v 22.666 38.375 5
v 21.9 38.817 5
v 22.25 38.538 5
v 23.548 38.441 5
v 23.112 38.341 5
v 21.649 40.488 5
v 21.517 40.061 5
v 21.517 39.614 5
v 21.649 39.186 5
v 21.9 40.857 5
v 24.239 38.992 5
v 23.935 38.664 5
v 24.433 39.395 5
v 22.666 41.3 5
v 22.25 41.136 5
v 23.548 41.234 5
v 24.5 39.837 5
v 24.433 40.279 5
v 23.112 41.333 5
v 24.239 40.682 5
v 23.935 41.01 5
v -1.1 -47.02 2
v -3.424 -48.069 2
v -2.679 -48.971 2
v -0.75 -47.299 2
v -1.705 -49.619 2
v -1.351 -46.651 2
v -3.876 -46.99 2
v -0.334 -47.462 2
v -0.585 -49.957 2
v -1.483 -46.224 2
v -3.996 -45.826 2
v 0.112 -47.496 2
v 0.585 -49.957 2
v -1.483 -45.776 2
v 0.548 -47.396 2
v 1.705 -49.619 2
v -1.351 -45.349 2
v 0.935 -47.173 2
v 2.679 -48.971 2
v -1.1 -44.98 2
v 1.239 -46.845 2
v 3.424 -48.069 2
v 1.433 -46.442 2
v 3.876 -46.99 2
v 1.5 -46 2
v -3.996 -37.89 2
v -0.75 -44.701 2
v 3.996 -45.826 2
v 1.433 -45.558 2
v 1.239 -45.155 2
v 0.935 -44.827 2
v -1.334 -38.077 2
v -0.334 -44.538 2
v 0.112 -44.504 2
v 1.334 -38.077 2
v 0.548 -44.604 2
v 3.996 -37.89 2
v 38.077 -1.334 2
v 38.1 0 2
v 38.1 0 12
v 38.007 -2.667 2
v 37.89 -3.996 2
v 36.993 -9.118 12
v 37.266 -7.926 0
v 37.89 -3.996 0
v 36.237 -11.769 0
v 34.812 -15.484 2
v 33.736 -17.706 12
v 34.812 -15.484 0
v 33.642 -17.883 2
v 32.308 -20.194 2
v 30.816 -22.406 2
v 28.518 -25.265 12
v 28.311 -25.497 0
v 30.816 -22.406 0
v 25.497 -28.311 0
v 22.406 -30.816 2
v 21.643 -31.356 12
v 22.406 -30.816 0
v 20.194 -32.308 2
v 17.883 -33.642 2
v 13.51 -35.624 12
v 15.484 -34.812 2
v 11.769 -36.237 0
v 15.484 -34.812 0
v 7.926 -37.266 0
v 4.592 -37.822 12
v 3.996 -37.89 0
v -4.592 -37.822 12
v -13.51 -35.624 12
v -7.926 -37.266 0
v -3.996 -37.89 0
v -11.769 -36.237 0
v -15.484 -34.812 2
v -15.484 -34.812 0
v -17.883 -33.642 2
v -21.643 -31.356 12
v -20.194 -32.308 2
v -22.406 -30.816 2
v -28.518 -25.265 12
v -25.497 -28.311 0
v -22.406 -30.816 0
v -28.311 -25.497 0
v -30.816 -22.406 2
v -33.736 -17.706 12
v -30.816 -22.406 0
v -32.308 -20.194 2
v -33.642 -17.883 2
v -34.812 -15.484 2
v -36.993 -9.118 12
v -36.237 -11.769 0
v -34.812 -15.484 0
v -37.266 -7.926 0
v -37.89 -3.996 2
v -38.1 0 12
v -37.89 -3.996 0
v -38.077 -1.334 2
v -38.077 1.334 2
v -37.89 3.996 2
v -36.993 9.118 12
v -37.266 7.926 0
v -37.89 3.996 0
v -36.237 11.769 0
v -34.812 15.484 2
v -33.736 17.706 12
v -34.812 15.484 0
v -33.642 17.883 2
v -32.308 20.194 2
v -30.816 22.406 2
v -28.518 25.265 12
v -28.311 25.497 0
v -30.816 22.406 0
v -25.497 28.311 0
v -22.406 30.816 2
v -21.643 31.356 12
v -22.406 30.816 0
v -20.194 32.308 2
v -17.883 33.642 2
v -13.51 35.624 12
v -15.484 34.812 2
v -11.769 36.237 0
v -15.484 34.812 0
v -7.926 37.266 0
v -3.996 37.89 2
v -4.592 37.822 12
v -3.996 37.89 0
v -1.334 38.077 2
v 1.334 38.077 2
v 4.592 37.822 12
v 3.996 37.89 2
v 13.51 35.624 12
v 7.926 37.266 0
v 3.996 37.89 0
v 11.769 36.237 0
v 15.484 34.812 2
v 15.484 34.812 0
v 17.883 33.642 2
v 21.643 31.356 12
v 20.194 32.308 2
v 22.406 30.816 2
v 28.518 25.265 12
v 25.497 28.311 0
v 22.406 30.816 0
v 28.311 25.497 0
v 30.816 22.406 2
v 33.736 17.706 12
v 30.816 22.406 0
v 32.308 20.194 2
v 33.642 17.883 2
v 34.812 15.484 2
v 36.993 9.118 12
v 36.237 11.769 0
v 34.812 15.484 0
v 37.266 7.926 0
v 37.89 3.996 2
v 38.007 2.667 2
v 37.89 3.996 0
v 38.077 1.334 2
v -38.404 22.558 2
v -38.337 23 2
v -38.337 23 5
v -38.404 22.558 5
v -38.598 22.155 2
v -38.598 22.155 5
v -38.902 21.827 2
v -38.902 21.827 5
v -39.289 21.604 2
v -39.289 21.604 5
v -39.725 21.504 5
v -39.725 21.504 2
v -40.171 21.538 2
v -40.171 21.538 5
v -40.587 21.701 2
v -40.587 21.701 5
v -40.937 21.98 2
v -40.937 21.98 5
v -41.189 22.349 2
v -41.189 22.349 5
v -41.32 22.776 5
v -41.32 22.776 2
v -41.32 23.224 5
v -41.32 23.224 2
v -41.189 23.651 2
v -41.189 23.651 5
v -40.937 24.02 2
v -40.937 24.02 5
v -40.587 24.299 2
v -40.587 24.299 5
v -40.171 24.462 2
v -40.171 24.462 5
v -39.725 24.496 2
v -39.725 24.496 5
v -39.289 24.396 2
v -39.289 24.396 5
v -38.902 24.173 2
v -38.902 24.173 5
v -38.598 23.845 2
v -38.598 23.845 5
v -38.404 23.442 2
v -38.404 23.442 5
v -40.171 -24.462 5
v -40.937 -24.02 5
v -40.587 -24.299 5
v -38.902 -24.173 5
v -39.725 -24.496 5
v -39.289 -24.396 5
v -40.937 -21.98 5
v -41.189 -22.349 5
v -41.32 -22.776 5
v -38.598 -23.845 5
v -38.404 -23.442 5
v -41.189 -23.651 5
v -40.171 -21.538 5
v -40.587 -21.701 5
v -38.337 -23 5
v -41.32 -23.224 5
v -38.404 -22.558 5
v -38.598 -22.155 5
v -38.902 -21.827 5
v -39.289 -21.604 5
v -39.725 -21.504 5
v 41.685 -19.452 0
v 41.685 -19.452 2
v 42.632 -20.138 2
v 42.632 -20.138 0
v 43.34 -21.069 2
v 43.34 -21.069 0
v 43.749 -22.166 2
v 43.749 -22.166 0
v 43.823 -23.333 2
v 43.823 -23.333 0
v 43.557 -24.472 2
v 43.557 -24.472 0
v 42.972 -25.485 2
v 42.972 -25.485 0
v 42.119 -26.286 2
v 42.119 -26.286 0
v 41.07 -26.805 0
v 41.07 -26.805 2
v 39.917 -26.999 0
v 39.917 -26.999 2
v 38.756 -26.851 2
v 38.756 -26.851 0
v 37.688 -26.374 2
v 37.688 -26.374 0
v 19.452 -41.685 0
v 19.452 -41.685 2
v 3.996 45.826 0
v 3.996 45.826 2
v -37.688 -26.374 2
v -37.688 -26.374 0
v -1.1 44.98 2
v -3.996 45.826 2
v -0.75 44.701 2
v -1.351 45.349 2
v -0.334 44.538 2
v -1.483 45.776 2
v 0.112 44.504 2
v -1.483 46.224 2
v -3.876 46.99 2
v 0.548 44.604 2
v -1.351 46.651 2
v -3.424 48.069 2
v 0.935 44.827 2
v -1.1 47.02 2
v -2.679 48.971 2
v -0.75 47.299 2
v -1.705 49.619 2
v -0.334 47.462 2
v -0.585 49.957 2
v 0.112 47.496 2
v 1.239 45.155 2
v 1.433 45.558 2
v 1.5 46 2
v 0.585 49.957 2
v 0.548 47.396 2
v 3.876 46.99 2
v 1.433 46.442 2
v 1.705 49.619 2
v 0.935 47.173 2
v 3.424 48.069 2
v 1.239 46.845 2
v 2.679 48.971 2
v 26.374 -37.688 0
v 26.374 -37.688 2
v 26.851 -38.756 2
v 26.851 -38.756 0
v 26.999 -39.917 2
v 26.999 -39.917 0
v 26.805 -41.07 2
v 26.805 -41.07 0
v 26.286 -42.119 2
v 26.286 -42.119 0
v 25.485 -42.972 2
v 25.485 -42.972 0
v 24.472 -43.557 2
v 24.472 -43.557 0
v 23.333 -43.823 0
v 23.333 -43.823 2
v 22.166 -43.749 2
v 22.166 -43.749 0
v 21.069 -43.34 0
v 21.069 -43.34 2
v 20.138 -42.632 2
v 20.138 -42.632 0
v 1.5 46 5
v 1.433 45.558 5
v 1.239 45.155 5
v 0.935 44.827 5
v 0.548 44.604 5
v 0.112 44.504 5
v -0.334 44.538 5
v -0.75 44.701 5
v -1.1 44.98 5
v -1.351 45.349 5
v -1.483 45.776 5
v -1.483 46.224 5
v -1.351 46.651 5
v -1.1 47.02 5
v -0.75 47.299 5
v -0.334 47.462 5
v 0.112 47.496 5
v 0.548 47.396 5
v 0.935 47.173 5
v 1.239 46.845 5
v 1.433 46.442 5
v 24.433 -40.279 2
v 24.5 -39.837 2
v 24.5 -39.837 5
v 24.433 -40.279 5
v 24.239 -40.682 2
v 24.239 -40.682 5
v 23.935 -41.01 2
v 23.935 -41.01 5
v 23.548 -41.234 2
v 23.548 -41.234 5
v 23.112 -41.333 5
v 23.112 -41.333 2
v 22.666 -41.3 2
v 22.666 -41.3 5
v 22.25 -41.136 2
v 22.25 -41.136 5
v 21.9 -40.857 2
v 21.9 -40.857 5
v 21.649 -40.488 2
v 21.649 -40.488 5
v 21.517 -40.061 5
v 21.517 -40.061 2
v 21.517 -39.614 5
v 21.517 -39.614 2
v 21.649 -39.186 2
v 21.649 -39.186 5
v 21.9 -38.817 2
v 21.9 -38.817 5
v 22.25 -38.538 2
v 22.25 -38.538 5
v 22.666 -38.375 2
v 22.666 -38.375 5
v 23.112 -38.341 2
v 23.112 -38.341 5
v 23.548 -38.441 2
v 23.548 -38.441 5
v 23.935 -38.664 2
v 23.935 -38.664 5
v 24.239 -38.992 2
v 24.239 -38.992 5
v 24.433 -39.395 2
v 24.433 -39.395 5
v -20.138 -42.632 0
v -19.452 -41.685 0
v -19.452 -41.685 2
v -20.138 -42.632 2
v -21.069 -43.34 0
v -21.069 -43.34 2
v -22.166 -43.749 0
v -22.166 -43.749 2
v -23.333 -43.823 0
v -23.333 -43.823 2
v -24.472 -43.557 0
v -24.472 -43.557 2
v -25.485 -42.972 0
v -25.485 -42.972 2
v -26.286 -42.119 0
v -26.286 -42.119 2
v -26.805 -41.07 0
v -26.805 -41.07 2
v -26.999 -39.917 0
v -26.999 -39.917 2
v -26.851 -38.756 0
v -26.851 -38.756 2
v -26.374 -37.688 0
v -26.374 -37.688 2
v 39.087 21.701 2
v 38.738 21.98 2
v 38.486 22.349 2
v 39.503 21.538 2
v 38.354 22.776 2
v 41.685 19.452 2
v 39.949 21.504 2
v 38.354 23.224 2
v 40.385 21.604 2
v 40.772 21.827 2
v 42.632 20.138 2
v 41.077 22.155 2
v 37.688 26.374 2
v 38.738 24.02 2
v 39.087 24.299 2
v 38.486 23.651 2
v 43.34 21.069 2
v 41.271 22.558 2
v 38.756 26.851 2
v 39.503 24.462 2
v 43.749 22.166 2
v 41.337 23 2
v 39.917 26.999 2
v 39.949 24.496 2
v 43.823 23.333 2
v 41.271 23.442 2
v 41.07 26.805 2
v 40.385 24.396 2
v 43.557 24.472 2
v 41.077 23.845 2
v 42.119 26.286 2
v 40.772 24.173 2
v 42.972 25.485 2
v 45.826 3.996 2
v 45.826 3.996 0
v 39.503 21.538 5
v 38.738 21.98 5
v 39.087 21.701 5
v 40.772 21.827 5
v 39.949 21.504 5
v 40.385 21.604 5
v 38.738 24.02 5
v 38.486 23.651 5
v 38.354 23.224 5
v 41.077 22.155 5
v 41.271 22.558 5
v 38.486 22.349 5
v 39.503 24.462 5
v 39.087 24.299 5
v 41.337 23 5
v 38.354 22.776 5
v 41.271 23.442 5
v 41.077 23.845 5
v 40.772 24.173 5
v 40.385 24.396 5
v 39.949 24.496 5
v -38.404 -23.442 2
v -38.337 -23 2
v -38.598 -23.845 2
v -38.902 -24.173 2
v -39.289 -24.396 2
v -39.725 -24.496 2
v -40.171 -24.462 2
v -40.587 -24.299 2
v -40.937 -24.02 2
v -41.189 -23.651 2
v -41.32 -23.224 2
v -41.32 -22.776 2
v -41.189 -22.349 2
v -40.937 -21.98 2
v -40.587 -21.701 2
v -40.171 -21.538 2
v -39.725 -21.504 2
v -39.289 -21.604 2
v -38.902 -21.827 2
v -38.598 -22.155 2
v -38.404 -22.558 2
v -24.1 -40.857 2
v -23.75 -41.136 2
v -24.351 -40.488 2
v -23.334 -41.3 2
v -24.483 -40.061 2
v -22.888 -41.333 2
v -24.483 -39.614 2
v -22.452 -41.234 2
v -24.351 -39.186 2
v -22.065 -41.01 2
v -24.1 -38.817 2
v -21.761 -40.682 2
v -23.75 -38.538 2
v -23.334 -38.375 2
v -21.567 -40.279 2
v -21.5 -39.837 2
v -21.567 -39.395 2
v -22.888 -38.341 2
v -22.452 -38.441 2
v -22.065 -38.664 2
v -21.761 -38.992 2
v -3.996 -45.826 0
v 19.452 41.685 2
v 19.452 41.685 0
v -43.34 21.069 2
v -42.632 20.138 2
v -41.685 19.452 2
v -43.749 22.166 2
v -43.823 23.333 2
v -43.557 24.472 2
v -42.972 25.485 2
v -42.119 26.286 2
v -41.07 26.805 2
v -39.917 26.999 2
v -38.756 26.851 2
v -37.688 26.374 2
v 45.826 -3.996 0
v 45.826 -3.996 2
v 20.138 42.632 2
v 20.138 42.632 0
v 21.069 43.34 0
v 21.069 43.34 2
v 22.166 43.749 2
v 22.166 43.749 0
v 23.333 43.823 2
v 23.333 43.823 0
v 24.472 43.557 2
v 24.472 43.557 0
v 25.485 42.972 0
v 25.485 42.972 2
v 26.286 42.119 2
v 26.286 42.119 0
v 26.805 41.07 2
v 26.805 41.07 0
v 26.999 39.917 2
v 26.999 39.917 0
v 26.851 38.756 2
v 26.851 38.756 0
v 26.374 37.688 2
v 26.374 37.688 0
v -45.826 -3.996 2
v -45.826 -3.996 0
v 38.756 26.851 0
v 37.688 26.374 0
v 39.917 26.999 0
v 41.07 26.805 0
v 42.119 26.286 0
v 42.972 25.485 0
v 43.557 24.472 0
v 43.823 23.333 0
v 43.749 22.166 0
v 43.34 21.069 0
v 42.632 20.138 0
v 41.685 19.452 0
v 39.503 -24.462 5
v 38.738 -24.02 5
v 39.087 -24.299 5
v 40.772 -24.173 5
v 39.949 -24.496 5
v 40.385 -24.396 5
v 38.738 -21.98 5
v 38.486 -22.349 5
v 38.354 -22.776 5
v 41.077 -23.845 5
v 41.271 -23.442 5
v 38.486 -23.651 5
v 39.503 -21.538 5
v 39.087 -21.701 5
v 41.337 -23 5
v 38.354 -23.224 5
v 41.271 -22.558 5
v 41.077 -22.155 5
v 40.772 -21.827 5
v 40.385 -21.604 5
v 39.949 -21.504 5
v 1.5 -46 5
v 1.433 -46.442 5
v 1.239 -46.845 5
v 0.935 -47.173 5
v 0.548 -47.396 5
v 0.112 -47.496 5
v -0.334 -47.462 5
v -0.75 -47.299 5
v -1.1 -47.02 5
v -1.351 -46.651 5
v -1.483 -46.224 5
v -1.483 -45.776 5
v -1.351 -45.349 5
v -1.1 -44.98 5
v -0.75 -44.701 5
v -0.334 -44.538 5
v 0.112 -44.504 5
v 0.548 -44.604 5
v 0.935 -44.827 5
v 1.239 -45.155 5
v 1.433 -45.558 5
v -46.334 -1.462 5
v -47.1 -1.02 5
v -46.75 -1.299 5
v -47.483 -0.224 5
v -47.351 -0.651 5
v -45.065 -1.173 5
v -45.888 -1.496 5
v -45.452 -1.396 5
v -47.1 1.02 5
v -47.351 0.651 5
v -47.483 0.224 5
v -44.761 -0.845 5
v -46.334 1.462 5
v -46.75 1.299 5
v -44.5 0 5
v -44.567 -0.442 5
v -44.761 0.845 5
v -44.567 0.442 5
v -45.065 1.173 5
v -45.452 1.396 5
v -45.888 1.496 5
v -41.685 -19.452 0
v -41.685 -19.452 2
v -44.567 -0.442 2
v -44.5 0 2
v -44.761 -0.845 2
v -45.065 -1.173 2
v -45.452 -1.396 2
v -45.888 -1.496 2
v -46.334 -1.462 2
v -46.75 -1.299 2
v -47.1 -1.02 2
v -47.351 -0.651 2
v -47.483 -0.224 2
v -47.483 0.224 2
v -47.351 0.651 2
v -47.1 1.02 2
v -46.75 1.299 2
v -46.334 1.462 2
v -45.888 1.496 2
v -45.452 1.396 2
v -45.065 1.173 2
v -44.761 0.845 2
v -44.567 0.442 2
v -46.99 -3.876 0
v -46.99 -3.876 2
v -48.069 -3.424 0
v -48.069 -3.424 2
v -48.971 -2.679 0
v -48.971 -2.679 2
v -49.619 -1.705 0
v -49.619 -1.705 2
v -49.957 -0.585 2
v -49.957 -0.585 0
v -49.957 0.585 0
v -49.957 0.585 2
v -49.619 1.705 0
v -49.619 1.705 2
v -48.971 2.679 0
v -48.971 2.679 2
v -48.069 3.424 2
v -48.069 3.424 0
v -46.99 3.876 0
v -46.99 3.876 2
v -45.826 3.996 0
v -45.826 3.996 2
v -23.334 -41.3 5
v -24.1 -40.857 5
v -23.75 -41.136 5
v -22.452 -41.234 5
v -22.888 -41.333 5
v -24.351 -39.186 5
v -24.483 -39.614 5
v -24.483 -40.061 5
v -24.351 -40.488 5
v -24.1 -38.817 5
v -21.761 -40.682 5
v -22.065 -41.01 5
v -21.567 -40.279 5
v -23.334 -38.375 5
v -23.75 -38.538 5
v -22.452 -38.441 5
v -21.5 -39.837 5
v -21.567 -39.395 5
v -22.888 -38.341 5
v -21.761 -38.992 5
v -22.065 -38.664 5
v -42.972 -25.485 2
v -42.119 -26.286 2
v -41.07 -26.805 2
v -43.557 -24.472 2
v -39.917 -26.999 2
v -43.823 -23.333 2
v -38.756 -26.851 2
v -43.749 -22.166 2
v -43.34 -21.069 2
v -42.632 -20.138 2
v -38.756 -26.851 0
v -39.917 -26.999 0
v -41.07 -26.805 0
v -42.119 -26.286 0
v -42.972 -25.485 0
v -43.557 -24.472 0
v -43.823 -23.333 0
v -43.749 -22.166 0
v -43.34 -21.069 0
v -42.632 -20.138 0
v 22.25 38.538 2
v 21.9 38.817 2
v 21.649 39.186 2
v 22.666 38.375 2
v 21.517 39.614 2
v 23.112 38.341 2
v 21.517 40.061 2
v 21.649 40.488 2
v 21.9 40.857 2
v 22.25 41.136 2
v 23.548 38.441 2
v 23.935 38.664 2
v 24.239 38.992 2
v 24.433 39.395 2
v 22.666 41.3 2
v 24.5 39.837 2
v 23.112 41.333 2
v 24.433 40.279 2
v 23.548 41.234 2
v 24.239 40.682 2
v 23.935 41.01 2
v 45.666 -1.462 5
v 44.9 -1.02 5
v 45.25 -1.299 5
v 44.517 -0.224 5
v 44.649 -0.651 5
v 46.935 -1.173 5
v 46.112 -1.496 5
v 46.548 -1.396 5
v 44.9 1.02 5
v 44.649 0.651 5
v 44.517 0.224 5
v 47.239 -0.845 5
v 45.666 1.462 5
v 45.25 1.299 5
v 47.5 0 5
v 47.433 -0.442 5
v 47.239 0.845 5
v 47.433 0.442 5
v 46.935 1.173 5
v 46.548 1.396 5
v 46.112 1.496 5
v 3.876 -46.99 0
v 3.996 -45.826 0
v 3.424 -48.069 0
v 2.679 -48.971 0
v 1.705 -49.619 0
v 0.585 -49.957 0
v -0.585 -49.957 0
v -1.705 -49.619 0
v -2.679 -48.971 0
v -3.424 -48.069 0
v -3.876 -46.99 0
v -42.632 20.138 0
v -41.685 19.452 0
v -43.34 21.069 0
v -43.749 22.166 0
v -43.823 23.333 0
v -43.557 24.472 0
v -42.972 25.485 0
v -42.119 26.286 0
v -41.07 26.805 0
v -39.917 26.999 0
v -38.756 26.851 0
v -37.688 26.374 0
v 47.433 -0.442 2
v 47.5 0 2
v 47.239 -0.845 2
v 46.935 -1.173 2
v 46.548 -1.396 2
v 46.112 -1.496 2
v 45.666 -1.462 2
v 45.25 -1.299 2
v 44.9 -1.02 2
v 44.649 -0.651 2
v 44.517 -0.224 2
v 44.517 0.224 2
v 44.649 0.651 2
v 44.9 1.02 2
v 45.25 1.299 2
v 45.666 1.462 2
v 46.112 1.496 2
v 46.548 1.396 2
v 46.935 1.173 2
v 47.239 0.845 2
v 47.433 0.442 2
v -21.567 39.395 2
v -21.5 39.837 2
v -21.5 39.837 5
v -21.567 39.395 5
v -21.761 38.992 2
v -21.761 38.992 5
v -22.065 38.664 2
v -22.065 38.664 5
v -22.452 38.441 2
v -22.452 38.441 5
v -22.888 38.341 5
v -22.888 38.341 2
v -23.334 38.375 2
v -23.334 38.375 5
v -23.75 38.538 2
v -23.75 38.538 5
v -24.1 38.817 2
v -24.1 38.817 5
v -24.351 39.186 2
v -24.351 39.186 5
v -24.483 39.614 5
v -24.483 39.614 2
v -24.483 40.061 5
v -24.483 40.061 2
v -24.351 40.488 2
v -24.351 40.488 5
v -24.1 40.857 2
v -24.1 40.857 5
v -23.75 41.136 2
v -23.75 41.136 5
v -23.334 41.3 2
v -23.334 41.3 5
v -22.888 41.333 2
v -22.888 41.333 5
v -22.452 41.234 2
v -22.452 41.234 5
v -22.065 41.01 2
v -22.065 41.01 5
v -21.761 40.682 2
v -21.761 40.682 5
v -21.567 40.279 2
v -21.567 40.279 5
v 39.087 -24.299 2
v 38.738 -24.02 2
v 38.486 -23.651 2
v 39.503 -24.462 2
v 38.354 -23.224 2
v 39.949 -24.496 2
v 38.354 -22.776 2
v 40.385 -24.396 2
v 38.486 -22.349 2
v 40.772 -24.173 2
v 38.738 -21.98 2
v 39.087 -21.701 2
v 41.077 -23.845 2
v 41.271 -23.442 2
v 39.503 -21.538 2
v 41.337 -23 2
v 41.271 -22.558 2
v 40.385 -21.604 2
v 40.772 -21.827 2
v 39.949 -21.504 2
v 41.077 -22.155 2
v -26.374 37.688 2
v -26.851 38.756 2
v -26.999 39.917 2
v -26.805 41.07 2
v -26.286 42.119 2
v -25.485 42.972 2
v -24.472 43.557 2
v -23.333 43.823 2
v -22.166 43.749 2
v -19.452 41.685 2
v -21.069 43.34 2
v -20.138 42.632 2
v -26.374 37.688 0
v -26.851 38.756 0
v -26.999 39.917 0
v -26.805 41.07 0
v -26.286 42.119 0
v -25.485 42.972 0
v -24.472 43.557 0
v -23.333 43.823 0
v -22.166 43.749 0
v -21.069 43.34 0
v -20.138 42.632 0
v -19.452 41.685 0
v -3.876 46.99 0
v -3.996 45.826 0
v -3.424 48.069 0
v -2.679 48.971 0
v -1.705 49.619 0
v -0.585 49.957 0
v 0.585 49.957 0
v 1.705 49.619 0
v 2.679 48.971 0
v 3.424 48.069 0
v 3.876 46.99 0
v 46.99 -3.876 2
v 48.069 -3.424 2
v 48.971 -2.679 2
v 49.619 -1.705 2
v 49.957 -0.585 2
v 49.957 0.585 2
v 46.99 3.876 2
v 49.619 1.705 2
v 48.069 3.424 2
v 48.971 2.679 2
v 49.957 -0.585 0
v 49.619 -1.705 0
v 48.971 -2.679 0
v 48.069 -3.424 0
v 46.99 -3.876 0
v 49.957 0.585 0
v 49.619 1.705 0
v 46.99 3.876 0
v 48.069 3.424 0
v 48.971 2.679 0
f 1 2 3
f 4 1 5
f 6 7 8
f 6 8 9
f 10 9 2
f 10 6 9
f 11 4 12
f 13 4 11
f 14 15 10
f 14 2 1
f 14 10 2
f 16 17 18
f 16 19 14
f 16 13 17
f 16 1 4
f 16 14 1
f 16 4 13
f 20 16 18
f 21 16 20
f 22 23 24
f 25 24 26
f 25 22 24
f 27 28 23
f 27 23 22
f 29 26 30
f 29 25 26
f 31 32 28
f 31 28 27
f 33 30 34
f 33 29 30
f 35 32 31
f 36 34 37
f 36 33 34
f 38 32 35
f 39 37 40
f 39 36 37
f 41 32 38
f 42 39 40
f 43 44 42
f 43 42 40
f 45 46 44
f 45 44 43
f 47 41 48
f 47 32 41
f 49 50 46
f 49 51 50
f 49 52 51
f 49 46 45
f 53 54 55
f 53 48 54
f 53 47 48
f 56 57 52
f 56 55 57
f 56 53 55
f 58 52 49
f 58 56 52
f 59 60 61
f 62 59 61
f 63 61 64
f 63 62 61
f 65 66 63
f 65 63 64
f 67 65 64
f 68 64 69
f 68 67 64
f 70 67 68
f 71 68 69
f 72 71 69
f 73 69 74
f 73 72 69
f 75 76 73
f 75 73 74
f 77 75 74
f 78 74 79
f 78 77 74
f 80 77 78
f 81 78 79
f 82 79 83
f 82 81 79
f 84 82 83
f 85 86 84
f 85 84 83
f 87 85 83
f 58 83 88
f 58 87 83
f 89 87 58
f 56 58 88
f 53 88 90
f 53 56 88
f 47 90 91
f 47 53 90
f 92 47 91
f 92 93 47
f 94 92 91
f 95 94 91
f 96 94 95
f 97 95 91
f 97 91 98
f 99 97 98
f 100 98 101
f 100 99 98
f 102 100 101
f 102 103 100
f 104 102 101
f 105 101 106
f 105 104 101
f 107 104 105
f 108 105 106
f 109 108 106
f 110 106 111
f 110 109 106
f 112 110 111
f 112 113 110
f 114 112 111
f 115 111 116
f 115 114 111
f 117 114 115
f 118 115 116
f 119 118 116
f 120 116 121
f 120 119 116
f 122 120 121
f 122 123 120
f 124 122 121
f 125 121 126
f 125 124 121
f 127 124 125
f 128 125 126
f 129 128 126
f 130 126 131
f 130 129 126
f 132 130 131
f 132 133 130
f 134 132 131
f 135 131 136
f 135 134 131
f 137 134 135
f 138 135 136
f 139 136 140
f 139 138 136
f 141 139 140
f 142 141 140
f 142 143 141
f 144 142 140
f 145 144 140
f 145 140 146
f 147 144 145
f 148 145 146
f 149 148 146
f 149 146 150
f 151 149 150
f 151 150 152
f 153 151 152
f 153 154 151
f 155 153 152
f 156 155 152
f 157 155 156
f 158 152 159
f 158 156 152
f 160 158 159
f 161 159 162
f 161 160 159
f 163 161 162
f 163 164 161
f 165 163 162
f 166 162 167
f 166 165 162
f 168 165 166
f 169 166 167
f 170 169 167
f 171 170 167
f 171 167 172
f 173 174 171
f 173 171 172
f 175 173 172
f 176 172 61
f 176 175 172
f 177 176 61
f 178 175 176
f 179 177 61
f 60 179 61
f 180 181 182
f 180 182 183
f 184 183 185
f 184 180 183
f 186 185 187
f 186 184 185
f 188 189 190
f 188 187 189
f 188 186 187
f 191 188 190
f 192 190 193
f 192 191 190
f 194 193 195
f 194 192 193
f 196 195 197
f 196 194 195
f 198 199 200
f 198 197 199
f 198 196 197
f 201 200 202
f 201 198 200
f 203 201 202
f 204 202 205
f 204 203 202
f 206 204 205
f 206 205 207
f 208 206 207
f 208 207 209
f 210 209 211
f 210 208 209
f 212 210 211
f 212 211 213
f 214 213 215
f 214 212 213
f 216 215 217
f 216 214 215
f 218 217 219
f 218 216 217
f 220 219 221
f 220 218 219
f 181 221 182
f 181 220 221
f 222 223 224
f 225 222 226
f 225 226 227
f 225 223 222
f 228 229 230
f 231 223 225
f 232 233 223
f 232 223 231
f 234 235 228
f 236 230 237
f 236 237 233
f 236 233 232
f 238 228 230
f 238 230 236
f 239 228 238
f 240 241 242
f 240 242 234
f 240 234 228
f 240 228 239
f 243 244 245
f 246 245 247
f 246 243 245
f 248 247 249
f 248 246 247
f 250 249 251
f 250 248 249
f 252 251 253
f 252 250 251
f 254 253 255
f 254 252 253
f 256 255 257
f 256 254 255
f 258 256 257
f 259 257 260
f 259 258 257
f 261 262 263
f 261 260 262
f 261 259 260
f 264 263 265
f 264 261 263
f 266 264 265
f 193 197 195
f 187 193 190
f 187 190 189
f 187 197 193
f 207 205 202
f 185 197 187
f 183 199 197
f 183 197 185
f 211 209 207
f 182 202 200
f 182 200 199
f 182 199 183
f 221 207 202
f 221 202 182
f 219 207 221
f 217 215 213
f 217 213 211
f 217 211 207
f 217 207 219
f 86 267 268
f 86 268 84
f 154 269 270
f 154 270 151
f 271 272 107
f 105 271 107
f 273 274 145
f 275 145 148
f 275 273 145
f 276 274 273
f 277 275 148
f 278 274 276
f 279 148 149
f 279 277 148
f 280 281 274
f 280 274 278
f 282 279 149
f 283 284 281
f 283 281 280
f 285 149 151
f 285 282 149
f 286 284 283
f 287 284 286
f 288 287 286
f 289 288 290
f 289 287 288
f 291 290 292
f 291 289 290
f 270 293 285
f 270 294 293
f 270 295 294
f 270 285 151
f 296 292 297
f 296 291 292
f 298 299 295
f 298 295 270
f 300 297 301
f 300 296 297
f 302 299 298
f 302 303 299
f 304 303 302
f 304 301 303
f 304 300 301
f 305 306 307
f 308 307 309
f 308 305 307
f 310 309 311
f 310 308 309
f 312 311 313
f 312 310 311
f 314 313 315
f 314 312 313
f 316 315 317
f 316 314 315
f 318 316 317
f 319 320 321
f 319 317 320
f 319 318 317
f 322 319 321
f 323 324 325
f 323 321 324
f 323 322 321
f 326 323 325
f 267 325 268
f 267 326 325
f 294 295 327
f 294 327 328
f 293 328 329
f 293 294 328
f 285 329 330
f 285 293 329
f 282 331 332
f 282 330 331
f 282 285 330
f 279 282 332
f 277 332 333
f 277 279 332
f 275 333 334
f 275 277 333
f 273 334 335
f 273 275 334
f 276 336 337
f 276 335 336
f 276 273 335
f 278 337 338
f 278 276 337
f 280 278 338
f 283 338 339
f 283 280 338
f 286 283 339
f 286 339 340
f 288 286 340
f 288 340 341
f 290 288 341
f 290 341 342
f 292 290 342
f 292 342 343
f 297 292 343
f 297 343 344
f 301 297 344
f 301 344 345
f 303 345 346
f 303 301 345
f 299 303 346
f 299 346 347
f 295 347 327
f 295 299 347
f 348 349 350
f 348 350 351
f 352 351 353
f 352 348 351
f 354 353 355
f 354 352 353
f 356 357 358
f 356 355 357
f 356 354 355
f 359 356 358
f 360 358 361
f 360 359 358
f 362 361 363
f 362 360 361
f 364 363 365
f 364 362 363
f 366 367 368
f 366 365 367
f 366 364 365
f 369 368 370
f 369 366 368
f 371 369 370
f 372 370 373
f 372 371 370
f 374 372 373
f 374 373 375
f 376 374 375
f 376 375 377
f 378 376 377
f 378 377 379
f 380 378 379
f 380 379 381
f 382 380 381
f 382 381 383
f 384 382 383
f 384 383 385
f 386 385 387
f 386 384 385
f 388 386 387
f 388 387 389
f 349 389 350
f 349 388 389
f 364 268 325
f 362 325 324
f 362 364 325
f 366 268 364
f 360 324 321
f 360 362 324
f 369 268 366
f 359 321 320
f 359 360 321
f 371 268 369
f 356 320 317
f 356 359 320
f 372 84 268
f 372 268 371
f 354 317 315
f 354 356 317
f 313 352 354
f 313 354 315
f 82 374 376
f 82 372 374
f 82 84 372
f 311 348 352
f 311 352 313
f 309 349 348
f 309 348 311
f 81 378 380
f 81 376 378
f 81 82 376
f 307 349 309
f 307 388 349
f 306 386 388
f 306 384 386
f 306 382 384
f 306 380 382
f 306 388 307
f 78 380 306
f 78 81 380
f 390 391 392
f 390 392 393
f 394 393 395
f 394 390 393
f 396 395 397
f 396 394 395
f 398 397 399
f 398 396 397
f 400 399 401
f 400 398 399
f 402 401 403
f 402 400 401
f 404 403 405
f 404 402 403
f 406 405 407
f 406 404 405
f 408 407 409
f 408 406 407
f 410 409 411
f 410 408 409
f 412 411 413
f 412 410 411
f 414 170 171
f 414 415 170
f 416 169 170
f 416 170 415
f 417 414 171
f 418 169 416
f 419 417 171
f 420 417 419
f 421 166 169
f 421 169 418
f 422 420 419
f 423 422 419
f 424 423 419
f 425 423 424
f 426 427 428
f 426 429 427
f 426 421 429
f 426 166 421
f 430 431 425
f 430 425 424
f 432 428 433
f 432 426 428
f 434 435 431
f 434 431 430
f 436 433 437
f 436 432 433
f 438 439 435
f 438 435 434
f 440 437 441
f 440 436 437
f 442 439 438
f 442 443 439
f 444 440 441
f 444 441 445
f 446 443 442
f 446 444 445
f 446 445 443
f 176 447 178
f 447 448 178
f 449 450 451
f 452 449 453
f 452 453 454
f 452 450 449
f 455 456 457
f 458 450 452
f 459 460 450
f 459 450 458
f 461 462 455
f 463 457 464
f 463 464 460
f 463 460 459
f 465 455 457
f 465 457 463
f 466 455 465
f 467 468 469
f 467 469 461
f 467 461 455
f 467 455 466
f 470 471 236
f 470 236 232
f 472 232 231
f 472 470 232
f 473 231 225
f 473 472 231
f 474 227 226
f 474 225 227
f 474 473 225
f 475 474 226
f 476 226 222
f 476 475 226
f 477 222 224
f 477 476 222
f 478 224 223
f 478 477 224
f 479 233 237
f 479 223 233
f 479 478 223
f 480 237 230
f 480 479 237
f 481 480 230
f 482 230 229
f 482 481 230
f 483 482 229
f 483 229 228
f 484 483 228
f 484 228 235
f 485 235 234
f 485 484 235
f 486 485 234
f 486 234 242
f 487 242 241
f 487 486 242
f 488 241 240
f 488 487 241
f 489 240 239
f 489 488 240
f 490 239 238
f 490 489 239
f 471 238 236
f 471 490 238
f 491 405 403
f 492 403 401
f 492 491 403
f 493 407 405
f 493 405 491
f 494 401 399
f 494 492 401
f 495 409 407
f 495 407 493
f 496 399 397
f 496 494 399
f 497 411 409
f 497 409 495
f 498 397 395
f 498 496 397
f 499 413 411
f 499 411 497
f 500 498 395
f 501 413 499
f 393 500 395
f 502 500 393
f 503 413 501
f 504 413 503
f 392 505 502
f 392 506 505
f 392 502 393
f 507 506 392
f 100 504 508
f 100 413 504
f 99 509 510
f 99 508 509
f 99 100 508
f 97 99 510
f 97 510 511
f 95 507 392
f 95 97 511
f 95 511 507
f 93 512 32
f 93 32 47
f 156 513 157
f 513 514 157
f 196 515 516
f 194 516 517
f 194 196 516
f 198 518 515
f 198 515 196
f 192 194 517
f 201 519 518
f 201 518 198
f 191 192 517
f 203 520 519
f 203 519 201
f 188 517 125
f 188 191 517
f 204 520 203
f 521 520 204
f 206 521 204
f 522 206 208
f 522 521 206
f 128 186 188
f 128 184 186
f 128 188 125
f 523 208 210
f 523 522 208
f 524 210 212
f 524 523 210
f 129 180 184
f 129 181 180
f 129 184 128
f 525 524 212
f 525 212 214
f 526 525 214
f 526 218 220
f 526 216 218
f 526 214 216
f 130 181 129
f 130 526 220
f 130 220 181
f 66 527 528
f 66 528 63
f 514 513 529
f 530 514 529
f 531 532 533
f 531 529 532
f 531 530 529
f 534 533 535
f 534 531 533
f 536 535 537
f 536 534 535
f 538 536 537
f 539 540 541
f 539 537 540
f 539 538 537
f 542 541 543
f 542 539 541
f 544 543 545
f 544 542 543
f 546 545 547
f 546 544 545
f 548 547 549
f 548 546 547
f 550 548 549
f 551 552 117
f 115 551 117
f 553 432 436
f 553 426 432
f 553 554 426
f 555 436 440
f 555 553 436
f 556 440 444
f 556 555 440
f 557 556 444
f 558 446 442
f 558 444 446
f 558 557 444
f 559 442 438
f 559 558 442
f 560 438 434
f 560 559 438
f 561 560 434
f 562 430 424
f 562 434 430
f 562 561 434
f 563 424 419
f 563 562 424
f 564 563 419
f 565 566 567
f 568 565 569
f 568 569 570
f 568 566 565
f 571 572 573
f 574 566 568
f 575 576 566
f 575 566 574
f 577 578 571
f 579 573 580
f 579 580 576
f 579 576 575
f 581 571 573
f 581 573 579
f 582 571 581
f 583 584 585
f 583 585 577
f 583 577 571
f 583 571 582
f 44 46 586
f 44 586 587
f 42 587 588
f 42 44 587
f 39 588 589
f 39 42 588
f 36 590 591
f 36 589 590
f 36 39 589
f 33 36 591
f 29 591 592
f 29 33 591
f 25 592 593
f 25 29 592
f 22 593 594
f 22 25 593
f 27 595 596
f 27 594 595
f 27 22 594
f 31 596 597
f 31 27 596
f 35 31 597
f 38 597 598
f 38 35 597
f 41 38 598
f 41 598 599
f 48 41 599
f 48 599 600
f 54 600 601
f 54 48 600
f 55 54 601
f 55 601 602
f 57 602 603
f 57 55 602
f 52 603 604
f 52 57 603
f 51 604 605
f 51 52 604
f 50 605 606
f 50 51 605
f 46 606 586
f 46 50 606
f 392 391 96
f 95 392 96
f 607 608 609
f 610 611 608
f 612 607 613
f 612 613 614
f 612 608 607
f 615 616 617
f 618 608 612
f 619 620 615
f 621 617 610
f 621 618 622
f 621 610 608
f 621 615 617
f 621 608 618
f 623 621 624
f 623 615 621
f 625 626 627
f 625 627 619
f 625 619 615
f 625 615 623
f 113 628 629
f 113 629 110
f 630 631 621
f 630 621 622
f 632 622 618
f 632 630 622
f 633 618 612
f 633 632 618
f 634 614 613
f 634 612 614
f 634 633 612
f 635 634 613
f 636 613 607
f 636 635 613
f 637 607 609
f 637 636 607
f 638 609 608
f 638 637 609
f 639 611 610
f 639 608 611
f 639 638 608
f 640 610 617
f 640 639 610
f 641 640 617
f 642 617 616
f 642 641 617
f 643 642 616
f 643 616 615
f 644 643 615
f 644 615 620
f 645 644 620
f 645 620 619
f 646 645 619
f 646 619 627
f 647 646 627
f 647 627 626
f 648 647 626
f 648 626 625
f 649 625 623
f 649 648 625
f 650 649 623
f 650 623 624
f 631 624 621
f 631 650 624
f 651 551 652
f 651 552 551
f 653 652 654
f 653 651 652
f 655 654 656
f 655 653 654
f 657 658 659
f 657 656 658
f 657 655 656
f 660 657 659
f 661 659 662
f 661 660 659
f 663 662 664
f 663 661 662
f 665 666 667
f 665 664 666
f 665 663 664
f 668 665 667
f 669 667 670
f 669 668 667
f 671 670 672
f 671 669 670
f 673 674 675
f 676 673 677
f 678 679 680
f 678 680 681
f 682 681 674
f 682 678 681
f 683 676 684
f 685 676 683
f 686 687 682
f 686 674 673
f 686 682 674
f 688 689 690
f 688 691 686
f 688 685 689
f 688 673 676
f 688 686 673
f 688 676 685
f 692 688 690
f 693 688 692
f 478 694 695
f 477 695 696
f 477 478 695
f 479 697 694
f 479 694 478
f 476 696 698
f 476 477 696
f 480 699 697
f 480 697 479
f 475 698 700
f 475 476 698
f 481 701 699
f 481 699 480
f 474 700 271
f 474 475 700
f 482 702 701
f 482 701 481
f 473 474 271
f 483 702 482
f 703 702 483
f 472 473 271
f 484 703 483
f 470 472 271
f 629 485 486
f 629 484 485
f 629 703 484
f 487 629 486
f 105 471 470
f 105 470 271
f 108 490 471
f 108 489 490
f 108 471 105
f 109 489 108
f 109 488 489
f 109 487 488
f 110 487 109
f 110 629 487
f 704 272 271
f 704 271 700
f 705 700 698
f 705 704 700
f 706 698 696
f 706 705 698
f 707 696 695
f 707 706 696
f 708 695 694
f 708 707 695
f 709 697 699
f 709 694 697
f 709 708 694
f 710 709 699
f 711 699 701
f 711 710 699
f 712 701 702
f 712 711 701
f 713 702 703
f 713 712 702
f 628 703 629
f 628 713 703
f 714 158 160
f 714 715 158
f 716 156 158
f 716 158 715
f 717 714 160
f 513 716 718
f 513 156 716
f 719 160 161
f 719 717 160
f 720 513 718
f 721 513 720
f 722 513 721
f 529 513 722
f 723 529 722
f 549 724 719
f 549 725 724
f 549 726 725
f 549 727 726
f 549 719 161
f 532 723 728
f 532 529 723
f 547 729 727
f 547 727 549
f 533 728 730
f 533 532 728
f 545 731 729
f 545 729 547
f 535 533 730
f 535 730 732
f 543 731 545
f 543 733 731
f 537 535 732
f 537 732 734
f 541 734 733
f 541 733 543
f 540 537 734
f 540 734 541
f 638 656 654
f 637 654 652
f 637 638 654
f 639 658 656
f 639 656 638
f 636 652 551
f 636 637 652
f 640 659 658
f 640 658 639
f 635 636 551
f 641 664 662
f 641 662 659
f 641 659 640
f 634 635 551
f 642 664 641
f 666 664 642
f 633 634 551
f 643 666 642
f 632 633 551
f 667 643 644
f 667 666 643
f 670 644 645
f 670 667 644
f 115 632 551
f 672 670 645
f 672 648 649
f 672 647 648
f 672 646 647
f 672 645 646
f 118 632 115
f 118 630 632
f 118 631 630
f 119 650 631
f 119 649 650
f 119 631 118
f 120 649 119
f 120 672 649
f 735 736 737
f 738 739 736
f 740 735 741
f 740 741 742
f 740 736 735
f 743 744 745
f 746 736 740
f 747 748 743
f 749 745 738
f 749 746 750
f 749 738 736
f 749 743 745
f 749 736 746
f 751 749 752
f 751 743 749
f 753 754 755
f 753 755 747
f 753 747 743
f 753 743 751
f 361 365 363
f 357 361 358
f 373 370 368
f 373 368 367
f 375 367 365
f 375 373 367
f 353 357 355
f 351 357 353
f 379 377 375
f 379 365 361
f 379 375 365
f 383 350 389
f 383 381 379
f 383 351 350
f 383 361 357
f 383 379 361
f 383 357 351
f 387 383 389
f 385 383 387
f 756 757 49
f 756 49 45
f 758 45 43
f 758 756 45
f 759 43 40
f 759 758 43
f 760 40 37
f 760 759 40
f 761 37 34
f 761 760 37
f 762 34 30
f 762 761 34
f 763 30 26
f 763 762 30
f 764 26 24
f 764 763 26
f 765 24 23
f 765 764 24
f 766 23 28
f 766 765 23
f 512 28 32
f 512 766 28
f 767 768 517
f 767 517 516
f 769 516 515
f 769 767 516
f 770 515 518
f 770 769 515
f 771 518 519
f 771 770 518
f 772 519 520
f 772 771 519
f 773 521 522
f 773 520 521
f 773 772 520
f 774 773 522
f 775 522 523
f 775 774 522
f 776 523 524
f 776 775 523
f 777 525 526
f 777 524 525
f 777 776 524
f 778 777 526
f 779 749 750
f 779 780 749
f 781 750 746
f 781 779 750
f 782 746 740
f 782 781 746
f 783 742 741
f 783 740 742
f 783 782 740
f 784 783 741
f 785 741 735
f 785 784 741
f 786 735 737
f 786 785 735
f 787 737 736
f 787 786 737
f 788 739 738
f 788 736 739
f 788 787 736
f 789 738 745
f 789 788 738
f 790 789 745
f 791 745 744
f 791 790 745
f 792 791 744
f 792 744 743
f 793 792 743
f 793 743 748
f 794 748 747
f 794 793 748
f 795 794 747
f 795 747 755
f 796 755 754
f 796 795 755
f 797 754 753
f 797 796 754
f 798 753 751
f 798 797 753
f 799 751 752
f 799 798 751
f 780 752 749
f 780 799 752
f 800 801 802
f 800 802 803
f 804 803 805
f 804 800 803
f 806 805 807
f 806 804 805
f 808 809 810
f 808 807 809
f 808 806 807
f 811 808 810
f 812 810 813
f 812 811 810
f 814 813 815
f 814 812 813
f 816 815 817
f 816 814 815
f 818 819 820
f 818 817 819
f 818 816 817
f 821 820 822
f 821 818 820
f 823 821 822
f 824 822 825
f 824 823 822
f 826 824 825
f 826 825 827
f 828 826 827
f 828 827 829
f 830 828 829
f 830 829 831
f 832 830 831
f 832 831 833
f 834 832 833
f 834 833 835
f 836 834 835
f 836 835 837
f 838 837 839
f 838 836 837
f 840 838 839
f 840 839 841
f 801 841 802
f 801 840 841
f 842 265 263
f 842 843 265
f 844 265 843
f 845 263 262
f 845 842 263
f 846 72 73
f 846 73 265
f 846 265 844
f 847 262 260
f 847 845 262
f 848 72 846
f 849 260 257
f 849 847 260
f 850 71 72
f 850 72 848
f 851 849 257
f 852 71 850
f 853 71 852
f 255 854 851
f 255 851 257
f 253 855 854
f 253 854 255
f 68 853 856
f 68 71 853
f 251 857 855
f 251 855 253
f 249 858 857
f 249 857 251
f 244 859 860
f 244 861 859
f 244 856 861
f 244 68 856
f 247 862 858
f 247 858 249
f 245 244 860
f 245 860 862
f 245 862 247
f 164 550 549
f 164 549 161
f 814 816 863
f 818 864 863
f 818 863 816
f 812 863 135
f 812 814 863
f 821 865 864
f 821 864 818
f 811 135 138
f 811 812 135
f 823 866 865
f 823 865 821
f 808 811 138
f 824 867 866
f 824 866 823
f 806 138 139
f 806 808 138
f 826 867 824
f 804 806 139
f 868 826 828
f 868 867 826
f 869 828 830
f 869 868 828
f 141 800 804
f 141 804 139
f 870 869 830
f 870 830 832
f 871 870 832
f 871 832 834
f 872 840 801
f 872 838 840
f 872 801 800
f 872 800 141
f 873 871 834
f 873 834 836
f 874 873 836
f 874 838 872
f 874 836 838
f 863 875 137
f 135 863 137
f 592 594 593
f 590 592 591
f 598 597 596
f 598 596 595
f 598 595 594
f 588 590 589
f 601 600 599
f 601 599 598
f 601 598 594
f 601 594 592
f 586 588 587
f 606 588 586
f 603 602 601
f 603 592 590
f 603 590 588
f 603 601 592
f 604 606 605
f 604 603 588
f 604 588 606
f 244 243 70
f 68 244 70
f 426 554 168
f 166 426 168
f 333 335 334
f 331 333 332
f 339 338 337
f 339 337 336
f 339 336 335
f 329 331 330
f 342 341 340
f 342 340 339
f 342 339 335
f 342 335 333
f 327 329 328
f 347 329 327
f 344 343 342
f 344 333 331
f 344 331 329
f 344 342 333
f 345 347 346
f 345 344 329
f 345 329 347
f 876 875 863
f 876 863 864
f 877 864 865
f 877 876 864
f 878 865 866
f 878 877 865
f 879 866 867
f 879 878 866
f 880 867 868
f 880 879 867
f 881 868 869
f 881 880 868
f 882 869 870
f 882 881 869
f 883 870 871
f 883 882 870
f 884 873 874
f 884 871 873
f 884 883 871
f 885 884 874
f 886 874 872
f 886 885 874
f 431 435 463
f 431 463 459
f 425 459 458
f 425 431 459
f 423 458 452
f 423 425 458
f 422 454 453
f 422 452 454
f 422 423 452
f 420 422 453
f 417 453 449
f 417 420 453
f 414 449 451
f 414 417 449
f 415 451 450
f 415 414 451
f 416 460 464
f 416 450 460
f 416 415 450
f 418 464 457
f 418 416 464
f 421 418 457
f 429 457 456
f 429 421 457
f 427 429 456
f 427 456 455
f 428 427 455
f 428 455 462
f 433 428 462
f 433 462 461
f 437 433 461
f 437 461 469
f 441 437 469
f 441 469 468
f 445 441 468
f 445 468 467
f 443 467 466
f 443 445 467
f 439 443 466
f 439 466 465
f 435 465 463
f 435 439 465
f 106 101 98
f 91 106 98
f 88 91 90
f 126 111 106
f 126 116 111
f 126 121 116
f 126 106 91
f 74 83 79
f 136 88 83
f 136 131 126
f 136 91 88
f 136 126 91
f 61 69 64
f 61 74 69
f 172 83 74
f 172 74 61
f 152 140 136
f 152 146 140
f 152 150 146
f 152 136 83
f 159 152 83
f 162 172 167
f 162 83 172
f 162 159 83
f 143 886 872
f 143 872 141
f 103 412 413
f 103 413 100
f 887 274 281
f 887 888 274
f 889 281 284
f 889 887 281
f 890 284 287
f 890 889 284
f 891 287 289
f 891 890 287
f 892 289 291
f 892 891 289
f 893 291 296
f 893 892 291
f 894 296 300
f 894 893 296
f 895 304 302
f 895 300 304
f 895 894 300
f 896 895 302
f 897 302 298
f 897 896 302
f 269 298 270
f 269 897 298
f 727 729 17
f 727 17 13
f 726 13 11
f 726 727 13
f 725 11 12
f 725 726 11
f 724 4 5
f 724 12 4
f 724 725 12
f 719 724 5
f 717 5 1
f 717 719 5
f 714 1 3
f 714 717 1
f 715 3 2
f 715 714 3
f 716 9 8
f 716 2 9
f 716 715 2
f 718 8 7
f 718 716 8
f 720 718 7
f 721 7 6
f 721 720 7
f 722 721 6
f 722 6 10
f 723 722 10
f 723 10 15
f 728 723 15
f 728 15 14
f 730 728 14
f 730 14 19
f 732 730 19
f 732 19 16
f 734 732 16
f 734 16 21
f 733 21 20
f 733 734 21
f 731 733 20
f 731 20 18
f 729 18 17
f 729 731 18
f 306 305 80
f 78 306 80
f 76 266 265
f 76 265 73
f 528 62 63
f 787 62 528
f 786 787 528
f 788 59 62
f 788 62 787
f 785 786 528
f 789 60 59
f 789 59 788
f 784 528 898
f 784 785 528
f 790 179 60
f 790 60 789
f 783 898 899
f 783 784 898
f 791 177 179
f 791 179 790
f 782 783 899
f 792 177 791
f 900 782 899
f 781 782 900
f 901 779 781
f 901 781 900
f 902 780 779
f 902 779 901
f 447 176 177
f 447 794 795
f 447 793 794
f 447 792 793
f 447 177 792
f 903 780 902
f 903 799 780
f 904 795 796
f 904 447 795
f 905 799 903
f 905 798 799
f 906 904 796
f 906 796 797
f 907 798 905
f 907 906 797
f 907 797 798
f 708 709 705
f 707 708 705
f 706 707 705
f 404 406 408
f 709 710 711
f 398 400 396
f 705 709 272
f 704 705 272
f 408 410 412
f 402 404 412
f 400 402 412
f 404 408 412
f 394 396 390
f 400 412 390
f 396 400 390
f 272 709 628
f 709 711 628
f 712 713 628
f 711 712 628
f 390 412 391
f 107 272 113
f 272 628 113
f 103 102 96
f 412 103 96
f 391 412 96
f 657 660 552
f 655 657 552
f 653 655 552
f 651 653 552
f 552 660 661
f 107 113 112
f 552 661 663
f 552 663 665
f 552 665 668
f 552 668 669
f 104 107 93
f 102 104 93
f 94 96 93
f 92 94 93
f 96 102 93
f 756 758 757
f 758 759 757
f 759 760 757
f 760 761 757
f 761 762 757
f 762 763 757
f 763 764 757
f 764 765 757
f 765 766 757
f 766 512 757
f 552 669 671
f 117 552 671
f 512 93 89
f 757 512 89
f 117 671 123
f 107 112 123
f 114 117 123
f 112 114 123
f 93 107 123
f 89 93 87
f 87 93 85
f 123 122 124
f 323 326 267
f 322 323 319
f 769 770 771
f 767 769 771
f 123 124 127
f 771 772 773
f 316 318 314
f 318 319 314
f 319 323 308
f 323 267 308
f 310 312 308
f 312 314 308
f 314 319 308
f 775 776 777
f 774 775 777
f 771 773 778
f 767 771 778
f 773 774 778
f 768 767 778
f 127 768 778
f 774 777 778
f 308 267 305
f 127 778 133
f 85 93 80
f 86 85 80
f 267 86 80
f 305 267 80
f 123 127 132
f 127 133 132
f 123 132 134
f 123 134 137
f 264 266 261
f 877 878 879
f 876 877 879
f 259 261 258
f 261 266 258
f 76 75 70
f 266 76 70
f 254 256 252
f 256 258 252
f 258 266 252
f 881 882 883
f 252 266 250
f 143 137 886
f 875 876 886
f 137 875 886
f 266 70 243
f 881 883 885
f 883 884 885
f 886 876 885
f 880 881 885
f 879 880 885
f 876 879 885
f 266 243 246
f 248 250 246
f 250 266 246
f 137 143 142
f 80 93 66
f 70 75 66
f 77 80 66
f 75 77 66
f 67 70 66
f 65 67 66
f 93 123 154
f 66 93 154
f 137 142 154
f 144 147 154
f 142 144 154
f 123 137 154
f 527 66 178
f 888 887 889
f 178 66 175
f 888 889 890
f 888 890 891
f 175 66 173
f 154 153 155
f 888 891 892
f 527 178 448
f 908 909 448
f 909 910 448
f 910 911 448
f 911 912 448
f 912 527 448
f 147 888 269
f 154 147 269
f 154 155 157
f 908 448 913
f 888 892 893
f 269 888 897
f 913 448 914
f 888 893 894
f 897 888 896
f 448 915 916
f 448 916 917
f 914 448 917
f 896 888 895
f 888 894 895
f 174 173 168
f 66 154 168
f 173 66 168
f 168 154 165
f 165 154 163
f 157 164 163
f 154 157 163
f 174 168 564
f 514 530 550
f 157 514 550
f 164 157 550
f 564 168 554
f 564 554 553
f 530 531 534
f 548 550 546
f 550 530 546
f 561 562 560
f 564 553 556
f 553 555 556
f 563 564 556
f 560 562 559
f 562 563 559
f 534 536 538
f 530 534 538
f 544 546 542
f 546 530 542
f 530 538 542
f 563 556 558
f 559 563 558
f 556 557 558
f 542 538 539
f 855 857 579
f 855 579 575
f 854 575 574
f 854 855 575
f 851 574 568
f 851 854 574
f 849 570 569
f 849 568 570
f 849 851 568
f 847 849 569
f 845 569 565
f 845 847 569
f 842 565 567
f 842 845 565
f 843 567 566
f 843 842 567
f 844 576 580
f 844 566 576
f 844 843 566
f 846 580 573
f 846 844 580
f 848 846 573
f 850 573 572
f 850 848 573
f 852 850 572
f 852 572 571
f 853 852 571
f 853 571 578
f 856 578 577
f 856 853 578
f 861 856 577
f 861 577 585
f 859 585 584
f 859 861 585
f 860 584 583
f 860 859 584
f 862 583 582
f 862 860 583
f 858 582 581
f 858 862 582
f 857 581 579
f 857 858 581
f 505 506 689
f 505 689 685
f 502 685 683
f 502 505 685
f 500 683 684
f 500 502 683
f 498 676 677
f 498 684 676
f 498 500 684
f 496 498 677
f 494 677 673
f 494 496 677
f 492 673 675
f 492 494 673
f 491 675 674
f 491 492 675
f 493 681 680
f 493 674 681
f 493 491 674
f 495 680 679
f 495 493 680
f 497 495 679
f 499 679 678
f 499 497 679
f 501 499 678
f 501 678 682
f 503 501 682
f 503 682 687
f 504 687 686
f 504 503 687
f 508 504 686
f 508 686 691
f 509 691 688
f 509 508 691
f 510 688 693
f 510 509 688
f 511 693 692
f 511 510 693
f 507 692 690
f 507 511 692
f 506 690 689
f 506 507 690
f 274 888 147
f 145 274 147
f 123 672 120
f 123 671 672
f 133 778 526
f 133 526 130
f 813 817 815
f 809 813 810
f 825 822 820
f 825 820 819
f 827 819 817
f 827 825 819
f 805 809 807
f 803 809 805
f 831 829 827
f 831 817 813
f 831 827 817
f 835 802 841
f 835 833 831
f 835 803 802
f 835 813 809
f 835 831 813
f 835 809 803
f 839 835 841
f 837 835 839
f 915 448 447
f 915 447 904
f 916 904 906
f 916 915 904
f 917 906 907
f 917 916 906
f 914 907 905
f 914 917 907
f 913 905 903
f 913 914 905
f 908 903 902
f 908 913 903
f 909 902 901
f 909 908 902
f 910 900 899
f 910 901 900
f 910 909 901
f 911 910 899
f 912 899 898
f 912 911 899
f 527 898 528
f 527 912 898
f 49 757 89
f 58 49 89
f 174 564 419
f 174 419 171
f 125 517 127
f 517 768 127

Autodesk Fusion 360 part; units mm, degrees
sketch "Sketch1" plane through (0, 0, 0) normal (0, 0, 1) x (1, 0, 0)
  circle A0 centre (0, 0) radius 38.1
  circle A1 centre (0, 0) radius 46 construction
  circle A2 centre (0, 46) radius 4
  line L0 (-3.9962, 45.8261) -> (-3.9962, 37.8898)
  line L1 (3.9962, 45.8261) -> (3.9962, 37.8898)
  circle A3 centre (0, 46) radius 1.5
  line L2 (-19.4522, 41.6847) -> (-15.4841, 34.8117)
  line L3 (-26.3739, 37.6884) -> (-22.4057, 30.8155)
  circle A4 centre (-23, 39.8372) radius 4
  circle A5 centre (-23, 39.8372) radius 1.5
  line L4 (-37.6884, 26.3739) -> (-30.8155, 22.4057)
  line L5 (-41.6847, 19.4522) -> (-34.8117, 15.4841)
  circle A6 centre (-39.8372, 23) radius 4
  circle A7 centre (-39.8372, 23) radius 1.5
  line L6 (-45.8261, 3.9962) -> (-37.8898, 3.9962)
  line L7 (-45.8261, -3.9962) -> (-37.8898, -3.9962)
  circle A8 centre (-46, 0) radius 4
  circle A9 centre (-46, 0) radius 1.5
  line L8 (-41.6847, -19.4522) -> (-34.8117, -15.4841)
  line L9 (-37.6884, -26.3739) -> (-30.8155, -22.4057)
  circle A10 centre (-39.8372, -23) radius 4
  circle A11 centre (-39.8372, -23) radius 1.5
  line L10 (-26.3739, -37.6884) -> (-22.4057, -30.8155)
  line L11 (-19.4522, -41.6847) -> (-15.4841, -34.8117)
  circle A12 centre (-23, -39.8372) radius 4
  circle A13 centre (-23, -39.8372) radius 1.5
  line L12 (-3.9962, -45.8261) -> (-3.9962, -37.8898)
  line L13 (3.9962, -45.8261) -> (3.9962, -37.8898)
  circle A14 centre (0, -46) radius 4
  circle A15 centre (0, -46) radius 1.5
  line L14 (19.4522, -41.6847) -> (15.4841, -34.8117)
  line L15 (26.3739, -37.6884) -> (22.4057, -30.8155)
  circle A16 centre (23, -39.8372) radius 4
  circle A17 centre (23, -39.8372) radius 1.5
  line L16 (37.6884, -26.3739) -> (30.8155, -22.4057)
  line L17 (41.6847, -19.4522) -> (34.8117, -15.4841)
  circle A18 centre (39.8372, -23) radius 4
  circle A19 centre (39.8372, -23) radius 1.5
  line L18 (45.8261, -3.9962) -> (37.8898, -3.9962)
  line L19 (45.8261, 3.9962) -> (37.8898, 3.9962)
  circle A20 centre (46, 0) radius 4
  circle A21 centre (46, 0) radius 1.5
  line L20 (41.6847, 19.4522) -> (34.8117, 15.4841)
  line L21 (37.6884, 26.3739) -> (30.8155, 22.4057)
  circle A22 centre (39.8372, 23) radius 4
  circle A23 centre (39.8372, 23) radius 1.5
  line L22 (26.3739, 37.6884) -> (22.4057, 30.8155)
  line L23 (19.4522, 41.6847) -> (15.4841, 34.8117)
  circle A24 centre (23, 39.8372) radius 4
  circle A25 centre (23, 39.8372) radius 1.5
  dimension "d374" = 76.2
  dimension "d375" = 92
  dimension "d376" = 8
  dimension "d377" = 3
  dimension "d379" = 360
extrude "Extrude1" add sketch "Sketch1" along normal blind 2 contours A0 | A0 L18 L19 A20 | A0 L20 L21 A22 | A20 | A0 L16 L17 A18 | A22 | A18 | A0 L22 L23 A24 | A0 L14 L15 A16 | A24 | A16 | A0 A2 L0 L1 | A0 L12 L13 A14 | A2 | A14 | A0 L2 L3 A4 | A0 L10 L11 A12 | A4 | A12 | A0 L4 L5 A6 | A0 L8 L9 A10 | A6 | A10 | A0 L6 L7 A8 | A8 | A3 | A5 | A7 | A9 | A11 | A13 | A15 | A17 | A19 | A21 | A23 | A25
extrude "Extrude2" add sketch "Sketch1" along normal blind 10 from surface at 2 contours A0
extrude "Extrude3" add sketch "Sketch1" along normal blind 3 from surface at 2 contours A3 | A5 | A7 | A9 | A11 | A13 | A15 | A17 | A19 | A21 | A23 | A25
equation "d374 = mmt_id"
equation "mmt_id = 76.2 mm" comment "LOC 75mm MMT"
